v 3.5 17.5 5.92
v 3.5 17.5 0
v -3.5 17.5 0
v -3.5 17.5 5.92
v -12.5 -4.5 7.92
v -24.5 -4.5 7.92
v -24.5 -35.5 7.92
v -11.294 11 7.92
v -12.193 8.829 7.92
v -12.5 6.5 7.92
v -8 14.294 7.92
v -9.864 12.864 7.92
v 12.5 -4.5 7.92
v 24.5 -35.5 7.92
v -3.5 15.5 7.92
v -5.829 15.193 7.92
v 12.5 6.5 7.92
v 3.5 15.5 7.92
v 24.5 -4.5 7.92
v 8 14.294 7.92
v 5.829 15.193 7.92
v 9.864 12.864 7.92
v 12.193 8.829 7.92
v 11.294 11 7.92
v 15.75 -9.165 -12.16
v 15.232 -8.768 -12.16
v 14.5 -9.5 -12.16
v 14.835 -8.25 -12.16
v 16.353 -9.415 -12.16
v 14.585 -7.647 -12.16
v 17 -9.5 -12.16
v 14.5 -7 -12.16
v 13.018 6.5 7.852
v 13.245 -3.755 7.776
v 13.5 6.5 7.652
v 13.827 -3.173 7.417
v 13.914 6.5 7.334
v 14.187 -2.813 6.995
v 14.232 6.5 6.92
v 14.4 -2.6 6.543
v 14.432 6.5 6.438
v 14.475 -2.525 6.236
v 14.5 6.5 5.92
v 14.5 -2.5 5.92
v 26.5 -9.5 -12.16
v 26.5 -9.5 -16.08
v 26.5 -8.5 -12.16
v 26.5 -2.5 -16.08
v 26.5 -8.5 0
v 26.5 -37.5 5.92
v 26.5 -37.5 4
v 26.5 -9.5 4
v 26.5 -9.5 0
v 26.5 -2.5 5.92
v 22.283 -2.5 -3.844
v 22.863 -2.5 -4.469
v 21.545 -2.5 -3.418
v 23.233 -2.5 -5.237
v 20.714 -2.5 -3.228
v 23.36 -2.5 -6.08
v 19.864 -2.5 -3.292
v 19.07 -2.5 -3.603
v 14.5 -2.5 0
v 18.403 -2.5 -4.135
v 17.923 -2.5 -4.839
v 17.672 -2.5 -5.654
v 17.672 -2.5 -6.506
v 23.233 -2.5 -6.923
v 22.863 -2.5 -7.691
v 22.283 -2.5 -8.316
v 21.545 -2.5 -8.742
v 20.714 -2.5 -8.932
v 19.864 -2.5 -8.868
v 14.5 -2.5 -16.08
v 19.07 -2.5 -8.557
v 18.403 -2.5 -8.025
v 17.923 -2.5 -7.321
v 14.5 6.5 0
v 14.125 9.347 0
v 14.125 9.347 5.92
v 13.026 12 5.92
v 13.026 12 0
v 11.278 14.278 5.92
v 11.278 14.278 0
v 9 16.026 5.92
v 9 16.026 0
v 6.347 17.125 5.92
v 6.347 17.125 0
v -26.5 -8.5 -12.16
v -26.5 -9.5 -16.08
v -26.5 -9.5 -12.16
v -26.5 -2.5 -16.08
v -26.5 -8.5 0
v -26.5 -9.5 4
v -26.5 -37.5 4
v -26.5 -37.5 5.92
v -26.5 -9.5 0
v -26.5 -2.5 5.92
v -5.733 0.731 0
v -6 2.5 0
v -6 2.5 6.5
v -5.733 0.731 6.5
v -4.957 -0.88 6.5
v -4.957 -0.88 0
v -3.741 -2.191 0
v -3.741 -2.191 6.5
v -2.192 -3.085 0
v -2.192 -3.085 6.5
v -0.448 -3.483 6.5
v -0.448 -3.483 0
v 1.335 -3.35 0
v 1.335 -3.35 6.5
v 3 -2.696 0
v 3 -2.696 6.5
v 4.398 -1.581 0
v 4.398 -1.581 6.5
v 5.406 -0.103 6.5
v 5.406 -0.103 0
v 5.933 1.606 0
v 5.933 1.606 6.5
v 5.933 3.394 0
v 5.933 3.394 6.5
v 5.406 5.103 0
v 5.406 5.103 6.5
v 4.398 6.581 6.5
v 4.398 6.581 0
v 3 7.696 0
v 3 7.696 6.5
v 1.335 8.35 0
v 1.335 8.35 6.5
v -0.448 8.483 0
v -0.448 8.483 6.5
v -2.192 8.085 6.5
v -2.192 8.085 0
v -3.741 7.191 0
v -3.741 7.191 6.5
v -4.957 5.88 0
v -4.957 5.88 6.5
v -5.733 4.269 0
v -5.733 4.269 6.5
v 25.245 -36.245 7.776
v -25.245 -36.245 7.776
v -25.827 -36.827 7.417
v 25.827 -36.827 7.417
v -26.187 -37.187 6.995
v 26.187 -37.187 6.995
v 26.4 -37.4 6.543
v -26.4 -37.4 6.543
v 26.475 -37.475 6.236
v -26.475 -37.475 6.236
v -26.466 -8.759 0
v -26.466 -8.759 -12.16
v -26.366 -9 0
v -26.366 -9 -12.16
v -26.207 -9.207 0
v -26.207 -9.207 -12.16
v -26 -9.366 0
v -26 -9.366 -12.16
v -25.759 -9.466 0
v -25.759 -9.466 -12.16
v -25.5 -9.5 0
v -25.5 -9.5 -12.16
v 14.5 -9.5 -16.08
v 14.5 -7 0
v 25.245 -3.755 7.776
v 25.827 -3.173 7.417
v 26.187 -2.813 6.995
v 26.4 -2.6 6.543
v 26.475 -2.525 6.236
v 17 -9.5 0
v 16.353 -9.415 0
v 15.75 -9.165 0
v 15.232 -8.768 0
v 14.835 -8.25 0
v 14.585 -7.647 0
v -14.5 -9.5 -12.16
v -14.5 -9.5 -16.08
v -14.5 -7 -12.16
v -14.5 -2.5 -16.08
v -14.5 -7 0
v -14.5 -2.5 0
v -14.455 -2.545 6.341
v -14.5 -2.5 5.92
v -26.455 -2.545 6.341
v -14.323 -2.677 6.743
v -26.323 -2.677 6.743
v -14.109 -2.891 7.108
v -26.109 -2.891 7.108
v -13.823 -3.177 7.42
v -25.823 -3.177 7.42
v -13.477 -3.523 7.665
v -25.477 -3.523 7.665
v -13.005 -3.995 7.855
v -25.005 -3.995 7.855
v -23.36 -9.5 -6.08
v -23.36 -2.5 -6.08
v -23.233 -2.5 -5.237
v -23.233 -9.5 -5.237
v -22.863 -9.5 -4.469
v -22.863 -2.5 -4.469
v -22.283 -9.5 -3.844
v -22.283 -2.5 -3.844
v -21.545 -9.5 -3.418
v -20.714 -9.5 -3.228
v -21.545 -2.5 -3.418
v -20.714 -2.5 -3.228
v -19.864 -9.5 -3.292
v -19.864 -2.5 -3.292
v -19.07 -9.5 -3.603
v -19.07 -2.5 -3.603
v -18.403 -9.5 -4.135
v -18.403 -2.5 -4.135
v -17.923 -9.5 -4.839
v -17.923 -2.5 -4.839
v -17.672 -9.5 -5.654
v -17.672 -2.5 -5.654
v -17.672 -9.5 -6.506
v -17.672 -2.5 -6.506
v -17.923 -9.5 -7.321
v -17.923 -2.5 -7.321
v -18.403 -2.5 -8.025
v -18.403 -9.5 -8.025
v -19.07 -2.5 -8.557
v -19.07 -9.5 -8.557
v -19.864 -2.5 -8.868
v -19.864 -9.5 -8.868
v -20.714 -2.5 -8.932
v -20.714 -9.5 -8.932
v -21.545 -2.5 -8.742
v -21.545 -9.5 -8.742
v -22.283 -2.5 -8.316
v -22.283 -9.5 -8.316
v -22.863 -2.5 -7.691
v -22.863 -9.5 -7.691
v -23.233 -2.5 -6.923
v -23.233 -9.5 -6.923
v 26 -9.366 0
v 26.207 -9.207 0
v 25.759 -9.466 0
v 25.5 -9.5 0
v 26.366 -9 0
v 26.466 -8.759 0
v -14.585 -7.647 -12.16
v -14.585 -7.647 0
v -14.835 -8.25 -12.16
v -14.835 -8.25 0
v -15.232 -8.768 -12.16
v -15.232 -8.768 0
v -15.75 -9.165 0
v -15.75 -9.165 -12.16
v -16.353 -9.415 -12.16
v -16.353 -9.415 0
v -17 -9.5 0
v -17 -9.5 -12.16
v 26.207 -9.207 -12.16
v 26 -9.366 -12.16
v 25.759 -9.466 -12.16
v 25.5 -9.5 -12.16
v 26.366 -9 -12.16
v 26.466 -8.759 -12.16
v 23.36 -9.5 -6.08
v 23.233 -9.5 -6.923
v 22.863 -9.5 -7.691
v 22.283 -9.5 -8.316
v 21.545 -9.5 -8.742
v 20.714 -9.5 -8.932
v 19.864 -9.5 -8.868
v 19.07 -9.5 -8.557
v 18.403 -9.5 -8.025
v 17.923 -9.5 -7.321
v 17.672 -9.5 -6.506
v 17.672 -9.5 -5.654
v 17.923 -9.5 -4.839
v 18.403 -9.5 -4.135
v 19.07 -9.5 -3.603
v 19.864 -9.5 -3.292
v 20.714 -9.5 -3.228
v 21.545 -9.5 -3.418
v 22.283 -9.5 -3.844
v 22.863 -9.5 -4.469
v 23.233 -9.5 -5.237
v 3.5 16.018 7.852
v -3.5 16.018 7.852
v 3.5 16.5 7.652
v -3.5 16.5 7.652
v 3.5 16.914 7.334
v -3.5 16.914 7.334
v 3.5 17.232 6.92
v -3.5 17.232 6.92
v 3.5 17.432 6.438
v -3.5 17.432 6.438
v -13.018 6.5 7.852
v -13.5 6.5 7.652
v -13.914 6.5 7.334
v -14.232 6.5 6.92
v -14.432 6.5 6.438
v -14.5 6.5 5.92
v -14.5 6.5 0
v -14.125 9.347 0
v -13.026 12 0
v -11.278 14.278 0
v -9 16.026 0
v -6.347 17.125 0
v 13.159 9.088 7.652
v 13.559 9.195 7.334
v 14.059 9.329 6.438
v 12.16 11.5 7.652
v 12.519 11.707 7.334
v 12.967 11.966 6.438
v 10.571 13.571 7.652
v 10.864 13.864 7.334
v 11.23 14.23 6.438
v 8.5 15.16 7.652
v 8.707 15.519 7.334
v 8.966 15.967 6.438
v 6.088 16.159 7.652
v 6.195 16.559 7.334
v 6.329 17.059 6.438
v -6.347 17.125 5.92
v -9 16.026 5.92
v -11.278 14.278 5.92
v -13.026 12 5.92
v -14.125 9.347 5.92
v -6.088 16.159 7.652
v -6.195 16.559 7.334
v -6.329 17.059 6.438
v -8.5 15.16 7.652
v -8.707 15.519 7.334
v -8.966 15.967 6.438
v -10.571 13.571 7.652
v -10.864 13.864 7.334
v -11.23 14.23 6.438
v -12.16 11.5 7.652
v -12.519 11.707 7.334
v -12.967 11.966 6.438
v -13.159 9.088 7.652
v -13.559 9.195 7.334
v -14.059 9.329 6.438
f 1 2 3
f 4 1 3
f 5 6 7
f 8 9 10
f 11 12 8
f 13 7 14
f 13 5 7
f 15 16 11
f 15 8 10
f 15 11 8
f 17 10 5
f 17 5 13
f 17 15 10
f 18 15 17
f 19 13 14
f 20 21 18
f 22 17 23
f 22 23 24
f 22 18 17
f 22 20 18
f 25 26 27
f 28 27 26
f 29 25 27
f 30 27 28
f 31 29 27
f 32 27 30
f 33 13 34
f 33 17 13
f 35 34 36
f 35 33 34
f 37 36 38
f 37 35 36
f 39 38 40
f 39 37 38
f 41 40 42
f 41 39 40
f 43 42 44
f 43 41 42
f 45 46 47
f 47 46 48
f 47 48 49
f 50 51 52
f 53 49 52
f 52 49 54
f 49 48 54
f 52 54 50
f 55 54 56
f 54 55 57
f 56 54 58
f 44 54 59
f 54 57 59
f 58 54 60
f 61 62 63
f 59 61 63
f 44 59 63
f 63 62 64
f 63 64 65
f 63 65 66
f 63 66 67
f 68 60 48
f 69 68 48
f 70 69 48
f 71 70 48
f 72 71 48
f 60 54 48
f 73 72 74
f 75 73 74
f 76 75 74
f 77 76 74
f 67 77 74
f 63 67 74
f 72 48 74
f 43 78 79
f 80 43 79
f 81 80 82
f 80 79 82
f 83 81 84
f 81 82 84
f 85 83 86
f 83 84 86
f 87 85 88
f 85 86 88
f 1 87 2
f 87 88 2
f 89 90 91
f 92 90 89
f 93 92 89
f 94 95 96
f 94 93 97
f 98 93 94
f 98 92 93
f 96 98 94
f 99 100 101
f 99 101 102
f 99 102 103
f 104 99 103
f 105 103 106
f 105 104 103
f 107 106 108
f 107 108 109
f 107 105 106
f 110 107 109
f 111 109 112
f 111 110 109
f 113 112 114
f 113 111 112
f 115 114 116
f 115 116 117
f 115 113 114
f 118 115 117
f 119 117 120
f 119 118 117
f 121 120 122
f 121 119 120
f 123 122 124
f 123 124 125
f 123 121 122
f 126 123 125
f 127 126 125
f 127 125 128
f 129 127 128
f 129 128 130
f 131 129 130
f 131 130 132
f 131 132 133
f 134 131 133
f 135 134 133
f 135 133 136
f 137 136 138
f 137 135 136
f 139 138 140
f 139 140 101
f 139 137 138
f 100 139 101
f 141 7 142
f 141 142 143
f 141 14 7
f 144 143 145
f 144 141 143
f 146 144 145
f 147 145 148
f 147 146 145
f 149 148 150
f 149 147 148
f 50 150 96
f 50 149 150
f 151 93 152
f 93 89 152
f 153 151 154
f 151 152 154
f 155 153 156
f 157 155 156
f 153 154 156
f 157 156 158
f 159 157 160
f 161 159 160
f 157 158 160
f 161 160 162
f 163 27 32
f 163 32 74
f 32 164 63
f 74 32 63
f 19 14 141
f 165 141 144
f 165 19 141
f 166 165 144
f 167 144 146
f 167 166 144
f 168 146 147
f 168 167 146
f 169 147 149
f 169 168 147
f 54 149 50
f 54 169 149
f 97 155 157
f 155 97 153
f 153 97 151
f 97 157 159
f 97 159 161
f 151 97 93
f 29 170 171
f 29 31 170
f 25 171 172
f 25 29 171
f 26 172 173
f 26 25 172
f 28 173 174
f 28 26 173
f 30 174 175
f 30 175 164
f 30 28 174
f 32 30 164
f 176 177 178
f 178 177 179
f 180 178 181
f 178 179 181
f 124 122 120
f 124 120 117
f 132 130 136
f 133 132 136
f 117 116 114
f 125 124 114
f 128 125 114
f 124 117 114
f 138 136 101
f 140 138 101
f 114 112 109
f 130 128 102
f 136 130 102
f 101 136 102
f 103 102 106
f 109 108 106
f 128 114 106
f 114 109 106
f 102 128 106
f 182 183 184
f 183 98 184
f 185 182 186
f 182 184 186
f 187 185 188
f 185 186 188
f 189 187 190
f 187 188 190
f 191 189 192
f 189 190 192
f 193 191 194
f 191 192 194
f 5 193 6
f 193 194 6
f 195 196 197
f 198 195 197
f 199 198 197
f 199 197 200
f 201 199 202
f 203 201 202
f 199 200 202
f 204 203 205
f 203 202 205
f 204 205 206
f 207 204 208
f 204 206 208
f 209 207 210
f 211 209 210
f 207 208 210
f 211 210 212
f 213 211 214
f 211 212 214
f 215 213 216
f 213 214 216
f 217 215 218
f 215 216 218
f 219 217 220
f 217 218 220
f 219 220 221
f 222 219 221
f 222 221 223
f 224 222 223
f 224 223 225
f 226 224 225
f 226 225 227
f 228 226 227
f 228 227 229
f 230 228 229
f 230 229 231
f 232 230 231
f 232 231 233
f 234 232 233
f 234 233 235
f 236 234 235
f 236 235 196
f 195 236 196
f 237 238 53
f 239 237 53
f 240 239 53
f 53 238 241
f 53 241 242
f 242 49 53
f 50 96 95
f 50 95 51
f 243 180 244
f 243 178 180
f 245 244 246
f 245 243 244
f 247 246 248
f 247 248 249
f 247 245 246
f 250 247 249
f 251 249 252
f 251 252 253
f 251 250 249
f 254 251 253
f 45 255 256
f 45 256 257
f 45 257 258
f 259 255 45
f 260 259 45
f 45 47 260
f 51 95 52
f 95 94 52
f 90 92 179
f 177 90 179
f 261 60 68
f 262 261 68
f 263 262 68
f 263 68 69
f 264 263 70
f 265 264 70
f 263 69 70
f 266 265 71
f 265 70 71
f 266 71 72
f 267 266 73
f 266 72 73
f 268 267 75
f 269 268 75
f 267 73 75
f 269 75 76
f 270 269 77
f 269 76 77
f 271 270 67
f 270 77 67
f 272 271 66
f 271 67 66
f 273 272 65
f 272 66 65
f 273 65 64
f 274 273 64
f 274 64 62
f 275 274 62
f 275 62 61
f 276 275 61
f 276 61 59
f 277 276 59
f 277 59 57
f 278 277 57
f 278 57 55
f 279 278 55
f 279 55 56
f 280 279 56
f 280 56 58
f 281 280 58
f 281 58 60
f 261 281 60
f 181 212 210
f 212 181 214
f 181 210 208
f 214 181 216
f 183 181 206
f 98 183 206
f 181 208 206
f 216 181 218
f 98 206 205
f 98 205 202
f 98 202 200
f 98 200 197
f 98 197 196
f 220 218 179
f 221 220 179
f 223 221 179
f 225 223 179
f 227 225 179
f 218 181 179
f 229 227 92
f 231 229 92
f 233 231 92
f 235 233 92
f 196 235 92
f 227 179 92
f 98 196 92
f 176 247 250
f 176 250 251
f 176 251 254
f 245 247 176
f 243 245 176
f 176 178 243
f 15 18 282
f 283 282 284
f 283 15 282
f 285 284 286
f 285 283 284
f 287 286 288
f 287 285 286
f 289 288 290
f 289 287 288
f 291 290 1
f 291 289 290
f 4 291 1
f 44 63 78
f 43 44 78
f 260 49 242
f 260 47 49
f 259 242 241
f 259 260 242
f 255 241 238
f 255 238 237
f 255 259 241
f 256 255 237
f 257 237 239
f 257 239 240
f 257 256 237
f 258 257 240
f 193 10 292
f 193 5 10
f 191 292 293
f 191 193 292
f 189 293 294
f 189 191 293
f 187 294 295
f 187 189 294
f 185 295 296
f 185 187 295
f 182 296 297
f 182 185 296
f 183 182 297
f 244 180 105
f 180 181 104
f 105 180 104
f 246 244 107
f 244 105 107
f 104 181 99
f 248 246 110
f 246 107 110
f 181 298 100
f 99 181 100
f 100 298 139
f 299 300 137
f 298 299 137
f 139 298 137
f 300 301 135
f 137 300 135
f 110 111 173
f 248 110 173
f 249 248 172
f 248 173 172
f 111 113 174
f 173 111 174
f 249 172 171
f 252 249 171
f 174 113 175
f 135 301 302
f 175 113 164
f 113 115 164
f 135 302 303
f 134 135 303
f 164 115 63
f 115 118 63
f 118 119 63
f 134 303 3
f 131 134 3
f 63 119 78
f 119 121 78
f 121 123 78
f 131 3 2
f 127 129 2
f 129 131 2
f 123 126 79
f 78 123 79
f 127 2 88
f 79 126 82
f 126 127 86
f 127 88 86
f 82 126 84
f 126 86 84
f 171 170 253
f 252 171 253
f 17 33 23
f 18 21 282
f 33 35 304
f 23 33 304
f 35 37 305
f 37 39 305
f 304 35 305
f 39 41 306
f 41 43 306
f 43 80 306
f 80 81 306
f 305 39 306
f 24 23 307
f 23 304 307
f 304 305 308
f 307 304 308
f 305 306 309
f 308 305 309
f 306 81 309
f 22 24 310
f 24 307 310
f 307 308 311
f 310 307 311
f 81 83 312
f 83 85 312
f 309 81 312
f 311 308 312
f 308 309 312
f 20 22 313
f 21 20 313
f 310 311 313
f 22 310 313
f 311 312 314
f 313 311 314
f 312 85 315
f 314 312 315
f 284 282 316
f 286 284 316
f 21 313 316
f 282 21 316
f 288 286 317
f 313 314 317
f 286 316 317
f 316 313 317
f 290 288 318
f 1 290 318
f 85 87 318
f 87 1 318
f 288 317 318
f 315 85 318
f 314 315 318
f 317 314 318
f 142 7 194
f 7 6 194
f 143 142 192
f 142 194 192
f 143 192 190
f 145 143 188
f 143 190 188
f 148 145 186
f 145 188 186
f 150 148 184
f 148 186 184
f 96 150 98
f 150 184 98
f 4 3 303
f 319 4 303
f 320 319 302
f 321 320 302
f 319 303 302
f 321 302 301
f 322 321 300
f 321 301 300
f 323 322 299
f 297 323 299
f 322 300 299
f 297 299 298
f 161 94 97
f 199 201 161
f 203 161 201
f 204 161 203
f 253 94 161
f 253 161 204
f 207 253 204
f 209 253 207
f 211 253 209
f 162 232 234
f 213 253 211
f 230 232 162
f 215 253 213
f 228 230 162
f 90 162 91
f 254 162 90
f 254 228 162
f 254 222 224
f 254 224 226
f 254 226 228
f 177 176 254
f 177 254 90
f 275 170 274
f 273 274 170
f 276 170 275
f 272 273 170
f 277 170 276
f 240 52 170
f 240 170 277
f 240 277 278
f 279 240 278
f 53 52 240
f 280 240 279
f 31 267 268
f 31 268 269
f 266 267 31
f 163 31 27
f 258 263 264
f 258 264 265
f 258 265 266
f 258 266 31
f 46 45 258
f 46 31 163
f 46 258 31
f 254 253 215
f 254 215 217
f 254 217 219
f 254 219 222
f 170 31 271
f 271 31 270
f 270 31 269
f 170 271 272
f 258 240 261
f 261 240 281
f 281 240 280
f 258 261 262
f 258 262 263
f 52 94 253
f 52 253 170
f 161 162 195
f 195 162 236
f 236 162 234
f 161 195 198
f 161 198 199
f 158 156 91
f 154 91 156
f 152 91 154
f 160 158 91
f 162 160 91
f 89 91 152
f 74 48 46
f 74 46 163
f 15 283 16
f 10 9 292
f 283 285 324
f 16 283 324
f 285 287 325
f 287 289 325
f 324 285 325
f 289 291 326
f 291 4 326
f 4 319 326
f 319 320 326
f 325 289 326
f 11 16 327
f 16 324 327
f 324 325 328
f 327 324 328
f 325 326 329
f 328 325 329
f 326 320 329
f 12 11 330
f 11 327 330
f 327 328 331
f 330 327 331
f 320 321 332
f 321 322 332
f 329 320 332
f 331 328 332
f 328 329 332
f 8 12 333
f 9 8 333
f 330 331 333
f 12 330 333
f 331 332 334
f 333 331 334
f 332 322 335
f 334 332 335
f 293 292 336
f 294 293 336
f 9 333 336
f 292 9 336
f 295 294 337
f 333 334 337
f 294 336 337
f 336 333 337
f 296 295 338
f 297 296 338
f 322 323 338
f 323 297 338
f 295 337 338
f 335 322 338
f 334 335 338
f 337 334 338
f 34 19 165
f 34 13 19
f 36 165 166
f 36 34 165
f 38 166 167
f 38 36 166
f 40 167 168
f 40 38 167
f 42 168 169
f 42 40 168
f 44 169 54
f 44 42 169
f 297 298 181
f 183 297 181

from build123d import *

# Parameters (mm, degrees)
SKETCH_1_W           = 53
SKETCH_1_H           = 35
EXTRUDE_1_DEPTH      = 3.92
SKETCH_2_W           = 12
SKETCH_2_H           = 27
CUT_EXTRUDE_1_DEPTH  = 4
EXTRUDE_2_DEPTH      = 16.08
EXTRUDE_2_DEPTH_BACK = 3.92
SKETCH_3_W           = 12
SKETCH_3_H           = 7
SKETCH_4_W           = 12
SKETCH_4_H           = 3.92
EXTRUDE_3_DEPTH      = 8
SKETCH_5_R           = 2.86
CUT_EXTRUDE_2_DEPTH  = 37.889245045
EXTRUDE_4_DEPTH      = 4
SKETCH_8_W           = 53
SKETCH_8_H           = 3.92
EXTRUDE_5_DEPTH      = 20
FILLET_1_R           = 2.5
FILLET_2_R           = 11
FILLET_3_R           = 1
FILLET_4_R           = 2
SKETCH_9_W           = 20.08
SKETCH_9_H           = 8
CUT_EXTRUDE_5_DEPTH  = 67.886593574
SKETCH_6_R           = 6
CUT_EXTRUDE_3_DEPTH  = 6.5


with BuildPart() as part:
    # 스케치1 → 보스-돌출1 (new body)
    with BuildSketch(Plane.XY):
        Rectangle(SKETCH_1_W, SKETCH_1_H)
    extrude(amount=EXTRUDE_1_DEPTH)

    # 스케치2 → 컷-돌출1 (cut)
    with BuildSketch(Plane.XY.offset(3.92)):
        with Locations((-20.5, 4)):
            Rectangle(SKETCH_2_W, SKETCH_2_H)
        with Locations((20.5, 4)):
            Rectangle(SKETCH_2_W, SKETCH_2_H)
    extrude(amount=-CUT_EXTRUDE_1_DEPTH, mode=Mode.SUBTRACT)

    # 스케치3 → 보스-돌출2 (add, two sides: drawn at the far end of the back side and taken through both)
    with BuildSketch(Plane(origin=(0, 0, 0), x_dir=(-1, 0, 0), z_dir=(0, 0, -1)).offset(-EXTRUDE_2_DEPTH_BACK)):
        with Locations((-20.5, -6)):
            Rectangle(SKETCH_3_W, SKETCH_3_H)
        with Locations((20.5, -6)):
            Rectangle(SKETCH_3_W, SKETCH_3_H)
    extrude(amount=EXTRUDE_2_DEPTH + EXTRUDE_2_DEPTH_BACK)

    # 스케치4 → 보스-돌출3 (add)
    with BuildSketch(Plane.XZ.offset(9.5)):
        with Locations((-20.5, -14.12)):
            Rectangle(SKETCH_4_W, SKETCH_4_H)
        with Locations((20.5, -14.12)):
            Rectangle(SKETCH_4_W, SKETCH_4_H)
    extrude(amount=EXTRUDE_3_DEPTH)

    # 스케치5 → 컷-돌출2 (cut, through all)
    with BuildSketch(Plane(origin=(0, -2.5, 0), x_dir=(1, 0, 0), z_dir=(0, 1, 0))):
        with Locations(Location((-20.5, 6.08, 0), (0, 0, 180))):
            Circle(SKETCH_5_R)
        with Locations((20.5, 6.08)):
            Circle(SKETCH_5_R)
    extrude(amount=-CUT_EXTRUDE_2_DEPTH, mode=Mode.SUBTRACT)

    # 스케치7 → 보스-돌출4 (add)
    with BuildSketch(Plane.XY.offset(3.92)):
        Polygon((-14.5, -2.5), (-26.5, -2.5), (-26.5, -17.5), (26.5, -17.5), (26.5, -2.5), (14.5, -2.5), (14.5, 17.5), (-14.5, 17.5), align=None)
    extrude(amount=EXTRUDE_4_DEPTH)

    # 스케치8 → 보스-돌출5 (add)
    with BuildSketch(Plane.XZ.offset(17.5)):
        with Locations((0, 5.96)):
            Rectangle(SKETCH_8_W, SKETCH_8_H)
    extrude(amount=EXTRUDE_5_DEPTH)

    # 필렛1
    fillet_1_edges = [part.edges().sort_by_distance(p)[0] for p in [
        (14.5, -9.5, -6.08),
        (-14.5, -9.5, -6.08),
    ]]
    fillet(fillet_1_edges, radius=FILLET_1_R)

    # 필렛2
    fillet_2_edges = [part.edges().sort_by_distance(p)[0] for p in [
        (-14.5, 17.5, 3.96),
        (14.5, 17.5, 3.96),
    ]]
    fillet(fillet_2_edges, radius=FILLET_2_R)

    # 필렛3
    fillet_3_edges = [part.edges().sort_by_distance(p)[0] for p in [
        (26.5, -9.5, -6.08),
        (-26.5, -9.5, -6.08),
    ]]
    fillet(fillet_3_edges, radius=FILLET_3_R)

    # 필렛4
    fillet_4_edges = [part.edges().sort_by_distance(p)[0] for p in [
        (-20.5, -2.5, 7.92),
        (-26.5, -20, 7.92),
        (26.5, -20, 7.92),
        (20.5, -2.5, 7.92),
        (14.5, 2, 7.92),
        (0, -37.5, 7.92),
        (-14.5, 2, 7.92),
        (0, 17.5, 7.92),
        (-11.278174593, 14.278174593, 7.92),
        (11.278174593, 14.278174593, 7.92),
    ]]
    fillet(fillet_4_edges, radius=FILLET_4_R)

    # 스케치9 → 컷-돌출5 (cut, through all)
    with BuildSketch(Plane(origin=(26.5, 0, 0), x_dir=(0, 0, -1), z_dir=(1, 0, 0))):
        with Locations((6.04, -13.5)):
            Rectangle(SKETCH_9_W, SKETCH_9_H)
    extrude(amount=-CUT_EXTRUDE_5_DEPTH, mode=Mode.SUBTRACT)

    # 스케치6 → 컷-돌출3 (cut)
    with BuildSketch(Plane.XY):
        with Locations(Location((0, 2.5, 0), (0, 0, 180))):
            Circle(SKETCH_6_R)
    extrude(amount=CUT_EXTRUDE_3_DEPTH, mode=Mode.SUBTRACT)


solid = part.part
